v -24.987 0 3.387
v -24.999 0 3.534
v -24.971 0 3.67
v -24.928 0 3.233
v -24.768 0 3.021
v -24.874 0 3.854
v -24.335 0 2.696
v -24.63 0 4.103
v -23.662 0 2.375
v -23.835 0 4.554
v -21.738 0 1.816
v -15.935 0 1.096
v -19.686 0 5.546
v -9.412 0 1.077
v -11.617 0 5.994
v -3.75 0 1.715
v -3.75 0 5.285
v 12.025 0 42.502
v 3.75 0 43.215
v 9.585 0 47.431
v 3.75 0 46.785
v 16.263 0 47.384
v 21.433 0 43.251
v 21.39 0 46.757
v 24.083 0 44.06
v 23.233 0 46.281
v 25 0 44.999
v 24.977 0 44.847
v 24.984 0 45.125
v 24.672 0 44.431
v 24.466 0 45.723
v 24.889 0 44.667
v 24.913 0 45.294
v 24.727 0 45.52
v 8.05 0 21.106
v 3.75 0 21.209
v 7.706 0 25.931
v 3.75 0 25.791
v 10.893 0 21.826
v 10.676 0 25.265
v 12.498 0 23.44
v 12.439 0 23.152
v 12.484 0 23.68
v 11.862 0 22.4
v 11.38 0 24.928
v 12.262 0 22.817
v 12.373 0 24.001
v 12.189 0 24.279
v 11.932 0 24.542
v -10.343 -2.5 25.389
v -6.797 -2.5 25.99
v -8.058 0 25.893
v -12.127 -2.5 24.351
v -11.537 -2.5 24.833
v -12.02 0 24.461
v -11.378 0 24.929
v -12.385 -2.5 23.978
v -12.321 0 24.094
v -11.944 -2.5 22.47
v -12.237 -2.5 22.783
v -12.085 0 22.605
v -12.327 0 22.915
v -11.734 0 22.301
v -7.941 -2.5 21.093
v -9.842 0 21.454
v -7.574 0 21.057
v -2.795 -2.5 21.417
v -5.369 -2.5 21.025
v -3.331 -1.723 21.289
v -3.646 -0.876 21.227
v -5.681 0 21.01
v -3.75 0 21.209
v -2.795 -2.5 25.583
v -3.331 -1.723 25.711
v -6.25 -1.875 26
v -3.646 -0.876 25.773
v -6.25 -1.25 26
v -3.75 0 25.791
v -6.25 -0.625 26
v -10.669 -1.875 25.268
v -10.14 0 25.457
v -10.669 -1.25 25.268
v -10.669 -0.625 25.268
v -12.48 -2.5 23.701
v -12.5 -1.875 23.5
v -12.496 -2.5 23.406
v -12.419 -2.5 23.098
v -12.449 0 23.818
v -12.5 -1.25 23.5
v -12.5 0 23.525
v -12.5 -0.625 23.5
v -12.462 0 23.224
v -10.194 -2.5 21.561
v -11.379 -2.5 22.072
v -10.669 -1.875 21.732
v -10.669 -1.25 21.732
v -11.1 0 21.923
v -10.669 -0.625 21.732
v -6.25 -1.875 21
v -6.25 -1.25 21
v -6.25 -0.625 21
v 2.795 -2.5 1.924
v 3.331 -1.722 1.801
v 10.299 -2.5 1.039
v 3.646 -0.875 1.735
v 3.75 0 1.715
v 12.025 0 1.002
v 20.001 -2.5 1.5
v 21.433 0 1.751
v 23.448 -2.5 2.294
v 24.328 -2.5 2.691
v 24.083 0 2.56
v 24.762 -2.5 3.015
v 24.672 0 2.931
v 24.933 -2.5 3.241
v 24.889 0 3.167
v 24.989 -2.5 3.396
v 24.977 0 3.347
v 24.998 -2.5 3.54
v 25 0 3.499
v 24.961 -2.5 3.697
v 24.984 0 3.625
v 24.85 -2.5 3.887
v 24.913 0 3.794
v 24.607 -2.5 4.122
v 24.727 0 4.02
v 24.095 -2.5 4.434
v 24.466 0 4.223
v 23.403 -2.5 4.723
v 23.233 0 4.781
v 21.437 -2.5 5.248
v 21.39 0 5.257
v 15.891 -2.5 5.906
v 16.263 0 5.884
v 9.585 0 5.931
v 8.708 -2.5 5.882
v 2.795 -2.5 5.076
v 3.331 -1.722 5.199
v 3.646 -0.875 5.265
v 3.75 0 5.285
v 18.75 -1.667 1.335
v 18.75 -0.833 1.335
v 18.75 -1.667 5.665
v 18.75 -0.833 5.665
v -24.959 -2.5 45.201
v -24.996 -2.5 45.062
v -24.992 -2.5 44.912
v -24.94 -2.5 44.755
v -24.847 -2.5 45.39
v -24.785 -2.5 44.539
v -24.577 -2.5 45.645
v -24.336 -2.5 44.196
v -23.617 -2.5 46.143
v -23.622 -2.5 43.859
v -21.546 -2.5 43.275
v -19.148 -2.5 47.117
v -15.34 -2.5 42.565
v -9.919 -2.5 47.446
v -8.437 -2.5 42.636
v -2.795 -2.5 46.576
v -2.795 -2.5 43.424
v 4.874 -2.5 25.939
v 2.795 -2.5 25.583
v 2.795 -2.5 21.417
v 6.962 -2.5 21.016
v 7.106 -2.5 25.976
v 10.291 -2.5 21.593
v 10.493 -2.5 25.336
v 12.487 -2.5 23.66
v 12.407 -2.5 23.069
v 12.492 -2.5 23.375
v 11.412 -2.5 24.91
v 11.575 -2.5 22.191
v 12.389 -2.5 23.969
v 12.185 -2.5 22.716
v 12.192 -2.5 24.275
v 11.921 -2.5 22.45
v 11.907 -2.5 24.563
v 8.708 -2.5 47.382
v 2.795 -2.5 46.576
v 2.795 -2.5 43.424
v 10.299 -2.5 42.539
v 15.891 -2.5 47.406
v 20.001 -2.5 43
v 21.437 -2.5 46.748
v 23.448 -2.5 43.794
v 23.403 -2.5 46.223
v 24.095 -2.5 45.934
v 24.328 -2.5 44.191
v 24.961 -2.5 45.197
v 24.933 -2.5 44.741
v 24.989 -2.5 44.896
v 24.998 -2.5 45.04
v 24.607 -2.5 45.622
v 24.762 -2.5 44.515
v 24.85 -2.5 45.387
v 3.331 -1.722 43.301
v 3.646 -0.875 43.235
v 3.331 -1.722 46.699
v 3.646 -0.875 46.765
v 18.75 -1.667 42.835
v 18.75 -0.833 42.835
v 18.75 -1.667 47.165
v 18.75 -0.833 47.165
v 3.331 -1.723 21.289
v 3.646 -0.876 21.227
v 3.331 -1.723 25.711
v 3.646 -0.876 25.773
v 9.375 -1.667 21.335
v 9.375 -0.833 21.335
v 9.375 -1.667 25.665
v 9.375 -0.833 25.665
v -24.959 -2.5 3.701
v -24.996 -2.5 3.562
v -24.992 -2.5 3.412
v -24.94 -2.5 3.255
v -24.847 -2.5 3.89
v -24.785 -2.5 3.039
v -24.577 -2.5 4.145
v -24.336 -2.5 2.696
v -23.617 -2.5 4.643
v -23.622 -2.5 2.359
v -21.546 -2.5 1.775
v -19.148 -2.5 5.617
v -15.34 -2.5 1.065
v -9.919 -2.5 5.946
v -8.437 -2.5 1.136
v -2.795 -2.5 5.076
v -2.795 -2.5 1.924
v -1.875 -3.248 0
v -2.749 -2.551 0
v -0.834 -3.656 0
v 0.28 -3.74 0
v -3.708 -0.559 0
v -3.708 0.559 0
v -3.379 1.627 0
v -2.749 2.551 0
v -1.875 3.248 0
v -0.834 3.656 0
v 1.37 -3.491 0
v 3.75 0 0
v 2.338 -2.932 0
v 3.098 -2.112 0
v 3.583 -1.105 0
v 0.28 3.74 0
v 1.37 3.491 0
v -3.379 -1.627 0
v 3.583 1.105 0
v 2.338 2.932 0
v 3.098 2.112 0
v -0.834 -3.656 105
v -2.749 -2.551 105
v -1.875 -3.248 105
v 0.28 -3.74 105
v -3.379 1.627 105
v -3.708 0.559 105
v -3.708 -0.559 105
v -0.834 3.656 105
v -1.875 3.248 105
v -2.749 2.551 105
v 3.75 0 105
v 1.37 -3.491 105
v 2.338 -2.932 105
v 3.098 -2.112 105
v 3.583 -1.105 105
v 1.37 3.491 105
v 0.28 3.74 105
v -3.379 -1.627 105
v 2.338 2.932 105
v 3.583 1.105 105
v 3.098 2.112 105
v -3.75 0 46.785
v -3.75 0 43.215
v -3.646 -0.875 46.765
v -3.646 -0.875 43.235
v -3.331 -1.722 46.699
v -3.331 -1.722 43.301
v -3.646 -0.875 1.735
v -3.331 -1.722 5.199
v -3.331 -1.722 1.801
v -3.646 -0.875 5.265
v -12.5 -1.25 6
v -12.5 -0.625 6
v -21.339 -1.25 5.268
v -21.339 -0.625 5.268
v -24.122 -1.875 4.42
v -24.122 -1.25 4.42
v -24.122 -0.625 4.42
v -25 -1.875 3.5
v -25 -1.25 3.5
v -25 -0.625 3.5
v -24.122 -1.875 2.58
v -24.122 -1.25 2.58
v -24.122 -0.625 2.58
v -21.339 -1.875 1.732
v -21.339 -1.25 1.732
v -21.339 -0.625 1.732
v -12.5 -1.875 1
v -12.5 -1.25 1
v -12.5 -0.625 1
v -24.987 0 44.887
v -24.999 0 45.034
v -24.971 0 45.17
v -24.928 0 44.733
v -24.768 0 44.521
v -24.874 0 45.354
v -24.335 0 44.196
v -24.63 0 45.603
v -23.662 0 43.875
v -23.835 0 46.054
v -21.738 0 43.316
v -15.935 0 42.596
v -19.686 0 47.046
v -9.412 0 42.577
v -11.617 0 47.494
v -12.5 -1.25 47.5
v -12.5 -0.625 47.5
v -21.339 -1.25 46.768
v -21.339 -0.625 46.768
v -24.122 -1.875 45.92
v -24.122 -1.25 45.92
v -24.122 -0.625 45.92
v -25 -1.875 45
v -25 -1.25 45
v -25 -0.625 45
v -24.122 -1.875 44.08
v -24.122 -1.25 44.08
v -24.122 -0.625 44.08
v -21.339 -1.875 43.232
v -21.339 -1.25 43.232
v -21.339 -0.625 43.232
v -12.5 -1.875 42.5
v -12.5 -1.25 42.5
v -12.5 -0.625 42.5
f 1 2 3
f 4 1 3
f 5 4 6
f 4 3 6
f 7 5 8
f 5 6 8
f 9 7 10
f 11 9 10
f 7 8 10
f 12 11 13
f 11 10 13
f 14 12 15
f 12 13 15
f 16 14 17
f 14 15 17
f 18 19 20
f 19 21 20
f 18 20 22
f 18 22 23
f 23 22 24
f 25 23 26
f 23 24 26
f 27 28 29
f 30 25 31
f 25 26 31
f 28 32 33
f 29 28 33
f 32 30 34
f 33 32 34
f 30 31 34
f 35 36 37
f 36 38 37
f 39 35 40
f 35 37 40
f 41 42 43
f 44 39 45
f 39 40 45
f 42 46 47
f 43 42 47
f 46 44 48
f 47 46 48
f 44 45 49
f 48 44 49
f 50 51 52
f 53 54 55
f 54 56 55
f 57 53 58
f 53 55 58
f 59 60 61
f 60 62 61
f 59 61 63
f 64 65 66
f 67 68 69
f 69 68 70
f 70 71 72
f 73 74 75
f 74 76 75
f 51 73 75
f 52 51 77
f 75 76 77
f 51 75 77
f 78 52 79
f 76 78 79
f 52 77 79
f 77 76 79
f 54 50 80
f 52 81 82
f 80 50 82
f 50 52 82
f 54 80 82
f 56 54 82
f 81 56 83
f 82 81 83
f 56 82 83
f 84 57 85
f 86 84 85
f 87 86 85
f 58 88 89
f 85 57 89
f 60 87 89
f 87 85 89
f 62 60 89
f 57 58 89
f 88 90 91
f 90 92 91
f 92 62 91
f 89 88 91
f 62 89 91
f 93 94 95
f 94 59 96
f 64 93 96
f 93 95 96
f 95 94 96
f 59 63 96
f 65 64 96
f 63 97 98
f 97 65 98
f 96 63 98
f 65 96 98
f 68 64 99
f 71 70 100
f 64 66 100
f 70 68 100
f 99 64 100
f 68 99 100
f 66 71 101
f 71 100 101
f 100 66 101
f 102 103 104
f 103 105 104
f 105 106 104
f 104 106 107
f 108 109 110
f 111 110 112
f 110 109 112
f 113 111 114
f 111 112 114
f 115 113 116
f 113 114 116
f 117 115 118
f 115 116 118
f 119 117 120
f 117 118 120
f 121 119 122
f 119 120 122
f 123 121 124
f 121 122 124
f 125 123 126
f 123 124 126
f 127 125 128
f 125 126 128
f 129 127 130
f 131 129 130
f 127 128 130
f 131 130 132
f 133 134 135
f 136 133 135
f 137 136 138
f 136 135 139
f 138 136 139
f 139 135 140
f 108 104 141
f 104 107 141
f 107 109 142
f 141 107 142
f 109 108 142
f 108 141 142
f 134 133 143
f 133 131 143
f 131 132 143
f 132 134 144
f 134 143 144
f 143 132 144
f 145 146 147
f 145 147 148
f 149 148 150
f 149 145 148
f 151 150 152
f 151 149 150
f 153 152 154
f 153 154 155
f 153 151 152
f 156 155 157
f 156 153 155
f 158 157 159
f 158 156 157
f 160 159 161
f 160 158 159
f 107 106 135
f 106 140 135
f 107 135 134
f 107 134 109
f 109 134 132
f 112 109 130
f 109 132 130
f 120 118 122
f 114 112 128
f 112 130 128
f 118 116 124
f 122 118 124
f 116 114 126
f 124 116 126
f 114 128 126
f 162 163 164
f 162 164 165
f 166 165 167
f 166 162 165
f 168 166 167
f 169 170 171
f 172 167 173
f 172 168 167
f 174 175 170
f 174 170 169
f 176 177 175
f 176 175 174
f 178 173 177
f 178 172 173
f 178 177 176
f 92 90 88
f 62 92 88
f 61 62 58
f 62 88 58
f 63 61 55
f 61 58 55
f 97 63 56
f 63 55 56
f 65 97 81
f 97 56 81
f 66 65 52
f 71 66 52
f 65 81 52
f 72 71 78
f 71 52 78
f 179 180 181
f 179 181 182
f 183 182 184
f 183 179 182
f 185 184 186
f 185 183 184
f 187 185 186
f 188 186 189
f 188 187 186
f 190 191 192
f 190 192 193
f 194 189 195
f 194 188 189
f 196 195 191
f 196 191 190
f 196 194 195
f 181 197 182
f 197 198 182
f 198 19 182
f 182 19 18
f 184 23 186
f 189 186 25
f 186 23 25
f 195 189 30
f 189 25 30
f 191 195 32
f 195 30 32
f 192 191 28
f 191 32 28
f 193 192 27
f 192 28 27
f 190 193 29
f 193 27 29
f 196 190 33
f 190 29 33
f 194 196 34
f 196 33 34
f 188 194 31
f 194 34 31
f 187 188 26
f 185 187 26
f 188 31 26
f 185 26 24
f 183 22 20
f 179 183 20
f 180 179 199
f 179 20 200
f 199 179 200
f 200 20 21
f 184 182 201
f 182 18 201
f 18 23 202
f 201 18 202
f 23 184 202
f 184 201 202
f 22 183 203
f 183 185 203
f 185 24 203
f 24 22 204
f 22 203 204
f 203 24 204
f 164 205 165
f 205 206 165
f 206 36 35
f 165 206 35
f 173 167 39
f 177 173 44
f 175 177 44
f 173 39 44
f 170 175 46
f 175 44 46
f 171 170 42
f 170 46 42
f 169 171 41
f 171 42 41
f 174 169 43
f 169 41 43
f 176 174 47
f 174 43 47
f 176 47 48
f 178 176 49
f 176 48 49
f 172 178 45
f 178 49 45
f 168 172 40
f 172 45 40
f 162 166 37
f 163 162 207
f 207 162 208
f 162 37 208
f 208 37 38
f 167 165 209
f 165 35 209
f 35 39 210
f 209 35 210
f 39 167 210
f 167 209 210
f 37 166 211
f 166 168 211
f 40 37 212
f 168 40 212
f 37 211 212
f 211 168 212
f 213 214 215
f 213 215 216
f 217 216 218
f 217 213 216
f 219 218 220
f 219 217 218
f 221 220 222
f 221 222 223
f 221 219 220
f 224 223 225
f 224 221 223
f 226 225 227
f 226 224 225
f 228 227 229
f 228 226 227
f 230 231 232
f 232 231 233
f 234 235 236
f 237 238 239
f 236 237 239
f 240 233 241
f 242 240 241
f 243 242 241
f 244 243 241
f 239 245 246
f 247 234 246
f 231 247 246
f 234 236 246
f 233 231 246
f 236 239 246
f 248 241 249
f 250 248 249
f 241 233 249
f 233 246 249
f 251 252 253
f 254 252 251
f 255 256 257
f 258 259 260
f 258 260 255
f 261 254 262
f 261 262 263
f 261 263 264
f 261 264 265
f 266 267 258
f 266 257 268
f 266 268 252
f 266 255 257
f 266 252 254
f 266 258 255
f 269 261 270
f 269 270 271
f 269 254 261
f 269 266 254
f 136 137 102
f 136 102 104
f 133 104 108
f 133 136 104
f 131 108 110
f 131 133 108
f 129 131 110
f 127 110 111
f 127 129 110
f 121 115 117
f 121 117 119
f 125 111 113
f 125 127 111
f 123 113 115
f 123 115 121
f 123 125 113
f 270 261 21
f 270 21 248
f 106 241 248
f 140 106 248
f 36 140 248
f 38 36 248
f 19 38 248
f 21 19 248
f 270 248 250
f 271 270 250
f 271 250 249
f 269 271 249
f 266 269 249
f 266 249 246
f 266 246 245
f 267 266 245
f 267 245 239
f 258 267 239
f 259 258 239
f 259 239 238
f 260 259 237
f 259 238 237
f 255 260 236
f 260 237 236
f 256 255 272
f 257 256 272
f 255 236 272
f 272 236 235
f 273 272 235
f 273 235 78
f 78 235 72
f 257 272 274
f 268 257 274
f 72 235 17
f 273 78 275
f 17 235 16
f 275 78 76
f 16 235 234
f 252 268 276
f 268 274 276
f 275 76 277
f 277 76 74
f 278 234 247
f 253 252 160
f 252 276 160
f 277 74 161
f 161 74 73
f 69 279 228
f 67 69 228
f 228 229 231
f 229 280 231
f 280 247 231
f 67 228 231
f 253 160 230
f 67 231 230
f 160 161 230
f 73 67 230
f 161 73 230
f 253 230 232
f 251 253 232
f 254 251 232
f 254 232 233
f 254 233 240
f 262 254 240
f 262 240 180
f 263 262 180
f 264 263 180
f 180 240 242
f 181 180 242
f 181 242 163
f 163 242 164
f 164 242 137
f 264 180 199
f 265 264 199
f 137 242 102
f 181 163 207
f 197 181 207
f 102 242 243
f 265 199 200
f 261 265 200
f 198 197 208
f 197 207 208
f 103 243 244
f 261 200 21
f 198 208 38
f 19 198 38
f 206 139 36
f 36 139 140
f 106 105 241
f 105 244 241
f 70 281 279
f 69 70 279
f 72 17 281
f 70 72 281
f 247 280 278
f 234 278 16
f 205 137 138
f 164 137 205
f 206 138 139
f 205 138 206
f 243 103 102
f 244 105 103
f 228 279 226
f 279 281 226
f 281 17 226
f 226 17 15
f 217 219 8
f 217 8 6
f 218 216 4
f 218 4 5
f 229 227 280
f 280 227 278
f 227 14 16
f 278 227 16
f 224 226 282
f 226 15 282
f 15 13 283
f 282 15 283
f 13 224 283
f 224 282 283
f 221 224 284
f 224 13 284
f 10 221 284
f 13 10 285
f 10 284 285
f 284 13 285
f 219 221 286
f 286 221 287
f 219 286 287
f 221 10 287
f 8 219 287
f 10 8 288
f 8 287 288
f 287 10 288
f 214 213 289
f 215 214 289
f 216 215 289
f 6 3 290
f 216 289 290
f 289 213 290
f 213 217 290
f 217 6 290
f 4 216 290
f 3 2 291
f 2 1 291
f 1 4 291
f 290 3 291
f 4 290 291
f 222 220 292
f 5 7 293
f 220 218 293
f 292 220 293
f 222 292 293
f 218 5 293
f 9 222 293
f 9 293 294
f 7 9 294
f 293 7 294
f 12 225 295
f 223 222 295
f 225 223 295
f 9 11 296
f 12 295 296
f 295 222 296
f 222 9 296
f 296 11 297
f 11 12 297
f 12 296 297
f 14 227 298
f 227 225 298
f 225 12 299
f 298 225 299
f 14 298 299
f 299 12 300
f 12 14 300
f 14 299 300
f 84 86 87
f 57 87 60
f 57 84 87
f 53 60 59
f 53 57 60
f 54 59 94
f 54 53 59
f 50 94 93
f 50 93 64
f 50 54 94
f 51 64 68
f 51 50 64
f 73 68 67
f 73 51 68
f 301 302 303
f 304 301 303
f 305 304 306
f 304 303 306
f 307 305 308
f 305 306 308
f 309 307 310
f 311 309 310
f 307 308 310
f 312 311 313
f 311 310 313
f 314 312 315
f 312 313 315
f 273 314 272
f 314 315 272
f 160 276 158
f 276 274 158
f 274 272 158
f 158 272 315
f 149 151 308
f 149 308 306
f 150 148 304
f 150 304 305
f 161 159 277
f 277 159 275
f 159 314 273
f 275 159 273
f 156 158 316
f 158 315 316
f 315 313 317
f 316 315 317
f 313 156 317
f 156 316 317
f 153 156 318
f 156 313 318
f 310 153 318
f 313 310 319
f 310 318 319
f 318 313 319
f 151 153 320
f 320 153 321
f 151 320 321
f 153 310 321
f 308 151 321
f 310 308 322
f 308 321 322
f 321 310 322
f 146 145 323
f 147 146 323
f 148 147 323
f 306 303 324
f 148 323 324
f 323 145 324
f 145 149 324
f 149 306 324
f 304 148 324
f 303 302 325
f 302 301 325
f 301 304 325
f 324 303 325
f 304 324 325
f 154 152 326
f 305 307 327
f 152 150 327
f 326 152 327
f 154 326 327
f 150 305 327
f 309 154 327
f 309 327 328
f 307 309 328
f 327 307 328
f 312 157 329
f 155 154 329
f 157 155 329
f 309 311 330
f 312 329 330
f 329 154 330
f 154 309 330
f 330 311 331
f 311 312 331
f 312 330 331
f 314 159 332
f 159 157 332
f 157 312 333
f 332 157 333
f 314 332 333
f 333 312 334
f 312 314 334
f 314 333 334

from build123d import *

# Parameters (mm, degrees)
F0_R     = 3.75
F1_DEPTH = 105
F3_DEPTH = 2.5


with BuildPart() as f1:
    # F0 (on Top) → F1 (new body)
    with BuildSketch(Plane.XY):
        Circle(F0_R)
    extrude(amount=F1_DEPTH)

    # F2 (on Front) → F3 (join)
    with BuildSketch(Plane.XZ):
        with BuildLine():
            add(Edge.make_bspline(
                [(-25, 3.5), (-25, 1), (-12.5, 1), (0, 1), (0, 3.5)],
                knots=[0, 0, 0, 1.570796, 1.570796, 3.141593, 3.141593, 3.141593], degree=2, weights=[1, 0.707107, 1, 0.707107, 1]))
            add(Edge.make_bspline(
                [(0, 3.5), (0, 6), (-12.5, 6), (-25, 6), (-25, 3.5)],
                knots=[3.141593, 3.141593, 3.141593, 4.712389, 4.712389, 6.283185, 6.283185, 6.283185], degree=2, weights=[1, 0.707107, 1, 0.707107, 1]))
        make_face()
        with BuildLine():
            add(Edge.make_bspline(
                [(0, 23.5), (0, 19.169873), (9.375, 21.334936), (18.75, 23.5), (9.375, 25.665064), (0, 27.830127), (0, 23.5)],
                knots=[0, 0, 0, 2.094395, 2.094395, 4.18879, 4.18879, 6.283185, 6.283185, 6.283185], degree=2, weights=[1, 0.5, 1, 0.5, 1, 0.5, 1]))
        make_face()
        with BuildLine():
            add(Edge.make_bspline(
                [(-12.5, 23.5), (-12.5, 21), (-6.25, 21), (0, 21), (0, 23.5)],
                knots=[0, 0, 0, 1.570796, 1.570796, 3.141593, 3.141593, 3.141593], degree=2, weights=[1, 0.707107, 1, 0.707107, 1]))
            add(Edge.make_bspline(
                [(0, 23.5), (0, 26), (-6.25, 26), (-12.5, 26), (-12.5, 23.5)],
                knots=[3.141593, 3.141593, 3.141593, 4.712389, 4.712389, 6.283185, 6.283185, 6.283185], degree=2, weights=[1, 0.707107, 1, 0.707107, 1]))
        make_face()
        with BuildLine():
            add(Edge.make_bspline(
                [(0, 45), (0, 40.669873), (18.75, 42.834936), (37.5, 45), (18.75, 47.165064), (0, 49.330127), (0, 45)],
                knots=[0, 0, 0, 2.094395, 2.094395, 4.18879, 4.18879, 6.283185, 6.283185, 6.283185], degree=2, weights=[1, 0.5, 1, 0.5, 1, 0.5, 1]))
        make_face()
        with BuildLine():
            add(Edge.make_bspline(
                [(-25, 45), (-25, 42.5), (-12.5, 42.5), (0, 42.5), (0, 45)],
                knots=[0, 0, 0, 1.570796, 1.570796, 3.141593, 3.141593, 3.141593], degree=2, weights=[1, 0.707107, 1, 0.707107, 1]))
            add(Edge.make_bspline(
                [(0, 45), (0, 47.5), (-12.5, 47.5), (-25, 47.5), (-25, 45)],
                knots=[3.141593, 3.141593, 3.141593, 4.712389, 4.712389, 6.283185, 6.283185, 6.283185], degree=2, weights=[1, 0.707107, 1, 0.707107, 1]))
        make_face()
        with BuildLine():
            add(Edge.make_bspline(
                [(0, 3.5), (0, -0.830127), (18.75, 1.334936), (37.5, 3.5), (18.75, 5.665064), (0, 7.830127), (0, 3.5)],
                knots=[0, 0, 0, 2.094395, 2.094395, 4.18879, 4.18879, 6.283185, 6.283185, 6.283185], degree=2, weights=[1, 0.5, 1, 0.5, 1, 0.5, 1]))
        make_face()
    extrude(amount=F3_DEPTH)


solid = f1.part
